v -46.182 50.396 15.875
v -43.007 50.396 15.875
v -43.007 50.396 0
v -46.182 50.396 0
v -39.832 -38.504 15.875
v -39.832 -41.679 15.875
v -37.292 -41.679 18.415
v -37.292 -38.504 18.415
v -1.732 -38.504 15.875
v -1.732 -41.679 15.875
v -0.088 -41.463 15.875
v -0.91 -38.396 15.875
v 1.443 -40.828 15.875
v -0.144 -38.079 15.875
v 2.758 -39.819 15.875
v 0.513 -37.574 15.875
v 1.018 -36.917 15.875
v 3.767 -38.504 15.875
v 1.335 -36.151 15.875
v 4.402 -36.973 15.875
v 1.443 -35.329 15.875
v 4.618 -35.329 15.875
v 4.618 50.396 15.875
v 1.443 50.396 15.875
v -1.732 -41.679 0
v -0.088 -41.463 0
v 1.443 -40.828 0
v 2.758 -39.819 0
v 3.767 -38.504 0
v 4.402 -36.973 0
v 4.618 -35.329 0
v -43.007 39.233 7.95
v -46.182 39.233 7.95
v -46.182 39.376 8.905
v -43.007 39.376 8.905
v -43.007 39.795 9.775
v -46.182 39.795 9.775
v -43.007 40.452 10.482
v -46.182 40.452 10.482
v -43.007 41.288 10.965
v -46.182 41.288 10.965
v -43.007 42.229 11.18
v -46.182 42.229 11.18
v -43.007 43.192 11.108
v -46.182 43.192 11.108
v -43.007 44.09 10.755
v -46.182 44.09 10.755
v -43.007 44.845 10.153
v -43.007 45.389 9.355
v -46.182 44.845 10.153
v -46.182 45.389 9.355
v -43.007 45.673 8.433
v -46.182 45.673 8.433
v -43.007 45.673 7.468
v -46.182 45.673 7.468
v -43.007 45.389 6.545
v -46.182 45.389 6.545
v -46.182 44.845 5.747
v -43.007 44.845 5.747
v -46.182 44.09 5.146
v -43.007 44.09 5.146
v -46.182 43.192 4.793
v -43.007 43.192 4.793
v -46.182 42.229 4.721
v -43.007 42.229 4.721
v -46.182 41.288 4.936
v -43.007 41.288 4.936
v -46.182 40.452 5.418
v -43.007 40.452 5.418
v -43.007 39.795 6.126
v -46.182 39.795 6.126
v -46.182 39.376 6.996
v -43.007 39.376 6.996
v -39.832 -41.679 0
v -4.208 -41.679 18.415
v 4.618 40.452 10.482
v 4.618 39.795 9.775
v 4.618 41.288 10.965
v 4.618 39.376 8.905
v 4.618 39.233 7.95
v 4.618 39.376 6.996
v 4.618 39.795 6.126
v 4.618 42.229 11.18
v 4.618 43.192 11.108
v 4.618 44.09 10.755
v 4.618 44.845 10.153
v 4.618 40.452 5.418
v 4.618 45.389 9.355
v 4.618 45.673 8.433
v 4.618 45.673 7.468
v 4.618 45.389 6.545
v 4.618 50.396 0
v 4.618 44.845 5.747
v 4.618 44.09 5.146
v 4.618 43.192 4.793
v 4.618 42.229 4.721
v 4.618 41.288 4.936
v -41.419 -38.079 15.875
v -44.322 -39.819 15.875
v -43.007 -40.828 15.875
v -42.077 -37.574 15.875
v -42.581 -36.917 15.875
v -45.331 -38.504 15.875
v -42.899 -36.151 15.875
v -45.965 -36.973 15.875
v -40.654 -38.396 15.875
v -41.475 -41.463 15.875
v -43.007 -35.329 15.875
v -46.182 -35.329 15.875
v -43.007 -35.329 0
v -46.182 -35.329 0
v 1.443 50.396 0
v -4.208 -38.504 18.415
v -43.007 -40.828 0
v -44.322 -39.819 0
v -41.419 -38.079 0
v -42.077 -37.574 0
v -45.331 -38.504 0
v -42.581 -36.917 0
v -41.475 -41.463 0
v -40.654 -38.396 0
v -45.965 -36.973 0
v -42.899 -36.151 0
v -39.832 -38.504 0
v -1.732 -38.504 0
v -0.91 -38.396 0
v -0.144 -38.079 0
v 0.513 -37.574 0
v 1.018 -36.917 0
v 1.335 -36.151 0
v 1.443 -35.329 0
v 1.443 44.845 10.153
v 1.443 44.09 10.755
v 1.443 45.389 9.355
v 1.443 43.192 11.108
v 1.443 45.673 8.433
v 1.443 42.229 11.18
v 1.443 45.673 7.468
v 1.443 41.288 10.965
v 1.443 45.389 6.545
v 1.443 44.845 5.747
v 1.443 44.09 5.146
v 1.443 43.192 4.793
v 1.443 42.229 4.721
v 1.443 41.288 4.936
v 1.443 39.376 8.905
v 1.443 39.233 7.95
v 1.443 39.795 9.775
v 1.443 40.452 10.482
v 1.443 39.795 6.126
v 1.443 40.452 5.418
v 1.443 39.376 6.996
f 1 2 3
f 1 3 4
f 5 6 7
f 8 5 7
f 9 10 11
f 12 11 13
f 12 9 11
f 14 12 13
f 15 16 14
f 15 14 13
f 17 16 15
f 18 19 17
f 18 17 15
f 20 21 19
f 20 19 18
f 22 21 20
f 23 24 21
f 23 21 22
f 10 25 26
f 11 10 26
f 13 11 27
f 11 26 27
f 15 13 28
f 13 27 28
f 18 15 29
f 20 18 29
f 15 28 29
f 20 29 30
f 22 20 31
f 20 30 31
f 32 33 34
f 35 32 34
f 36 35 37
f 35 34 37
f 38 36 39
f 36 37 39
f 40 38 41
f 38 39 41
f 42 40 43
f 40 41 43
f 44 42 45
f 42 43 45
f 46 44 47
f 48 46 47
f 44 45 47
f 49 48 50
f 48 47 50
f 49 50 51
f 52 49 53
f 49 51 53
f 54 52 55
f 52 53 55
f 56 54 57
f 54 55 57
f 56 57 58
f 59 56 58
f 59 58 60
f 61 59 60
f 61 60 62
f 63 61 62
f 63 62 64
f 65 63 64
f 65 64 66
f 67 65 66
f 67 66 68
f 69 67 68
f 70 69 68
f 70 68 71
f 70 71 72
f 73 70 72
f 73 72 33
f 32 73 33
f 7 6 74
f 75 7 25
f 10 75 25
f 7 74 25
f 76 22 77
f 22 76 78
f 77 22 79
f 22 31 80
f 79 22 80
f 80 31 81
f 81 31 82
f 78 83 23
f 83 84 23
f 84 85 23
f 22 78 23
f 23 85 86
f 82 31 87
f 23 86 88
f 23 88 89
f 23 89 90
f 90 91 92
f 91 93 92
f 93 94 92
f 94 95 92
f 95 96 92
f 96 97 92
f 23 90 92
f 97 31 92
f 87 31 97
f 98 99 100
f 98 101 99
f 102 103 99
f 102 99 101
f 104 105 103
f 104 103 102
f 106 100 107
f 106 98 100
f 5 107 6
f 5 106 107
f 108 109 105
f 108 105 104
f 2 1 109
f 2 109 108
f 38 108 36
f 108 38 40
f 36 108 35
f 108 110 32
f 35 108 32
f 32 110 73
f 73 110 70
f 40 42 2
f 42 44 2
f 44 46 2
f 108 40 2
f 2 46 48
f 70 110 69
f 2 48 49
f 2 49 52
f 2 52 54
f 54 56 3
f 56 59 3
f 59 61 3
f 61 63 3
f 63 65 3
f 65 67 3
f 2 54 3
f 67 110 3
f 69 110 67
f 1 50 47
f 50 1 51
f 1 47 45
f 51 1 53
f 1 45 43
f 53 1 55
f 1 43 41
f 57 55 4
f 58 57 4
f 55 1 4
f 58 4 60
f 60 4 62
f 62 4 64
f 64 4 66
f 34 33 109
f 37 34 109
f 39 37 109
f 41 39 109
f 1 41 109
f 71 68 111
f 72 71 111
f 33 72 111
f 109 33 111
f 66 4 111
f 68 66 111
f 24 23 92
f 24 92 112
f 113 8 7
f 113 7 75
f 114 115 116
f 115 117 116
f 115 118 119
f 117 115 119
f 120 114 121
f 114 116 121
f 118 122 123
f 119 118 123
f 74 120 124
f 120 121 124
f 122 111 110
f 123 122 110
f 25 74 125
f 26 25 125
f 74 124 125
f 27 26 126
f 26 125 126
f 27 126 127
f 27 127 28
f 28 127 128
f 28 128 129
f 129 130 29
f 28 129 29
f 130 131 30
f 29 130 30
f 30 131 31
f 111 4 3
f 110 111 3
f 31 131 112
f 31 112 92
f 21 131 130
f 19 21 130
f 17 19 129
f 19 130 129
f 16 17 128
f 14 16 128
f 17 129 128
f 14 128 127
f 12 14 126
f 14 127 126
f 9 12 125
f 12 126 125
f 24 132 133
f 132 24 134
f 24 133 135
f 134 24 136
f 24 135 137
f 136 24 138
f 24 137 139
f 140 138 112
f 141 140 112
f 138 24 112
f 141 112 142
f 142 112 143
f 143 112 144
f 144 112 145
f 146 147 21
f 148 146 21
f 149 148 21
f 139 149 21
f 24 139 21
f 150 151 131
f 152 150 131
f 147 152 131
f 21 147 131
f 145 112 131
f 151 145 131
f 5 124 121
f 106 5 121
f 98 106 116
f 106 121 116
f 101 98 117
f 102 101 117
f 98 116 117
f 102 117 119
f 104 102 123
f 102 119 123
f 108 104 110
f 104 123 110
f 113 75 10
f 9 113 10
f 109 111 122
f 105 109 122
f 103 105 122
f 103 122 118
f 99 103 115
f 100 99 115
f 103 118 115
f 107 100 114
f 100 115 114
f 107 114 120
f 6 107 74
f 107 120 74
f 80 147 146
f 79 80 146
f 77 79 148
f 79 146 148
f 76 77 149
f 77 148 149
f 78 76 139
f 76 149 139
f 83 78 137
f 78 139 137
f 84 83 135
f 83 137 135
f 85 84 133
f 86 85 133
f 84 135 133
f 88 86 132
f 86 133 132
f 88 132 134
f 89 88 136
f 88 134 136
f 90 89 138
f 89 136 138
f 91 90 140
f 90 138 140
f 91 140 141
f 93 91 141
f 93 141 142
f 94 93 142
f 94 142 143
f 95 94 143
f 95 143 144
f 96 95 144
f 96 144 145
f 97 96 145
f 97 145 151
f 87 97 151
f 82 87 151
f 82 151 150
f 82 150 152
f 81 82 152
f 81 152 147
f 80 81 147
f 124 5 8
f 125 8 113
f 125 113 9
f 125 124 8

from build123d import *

# Parameters (mm, degrees)
F0_W     = 38.1
F0_H     = 3.175
F1_DEPTH = 15.875
F2_W     = 38.1
F2_H     = 3.175
F3_DEPTH = 2.54
F5_DEPTH = 25.4
F6_R     = 3.2385
F7_DEPTH = 101.6


with BuildPart() as f1:
    # F0 (on Top) → F1 (new body)
    with BuildSketch(Plane.XY):
        with BuildLine():
            Line((-43.00682, 50.395912), (-46.18182, 50.395912))
            Line((-46.18182, 50.395912), (-46.18182, -35.329088))
            ThreePointArc((-46.18182, -35.329088), (-44.321948, -39.819216), (-39.83182, -41.679088))
            Line((-39.83182, -41.679088), (-39.83182, -38.504088))
            ThreePointArc((-39.83182, -38.504088), (-42.076884, -37.574152), (-43.00682, -35.329088))
            Line((-43.00682, -35.329088), (-43.00682, 50.395912))
        make_face()
        with Locations((-20.78182, -40.091588)):
            Rectangle(F0_W, F0_H)
        with BuildLine():
            Line((-1.73182, -38.504088), (-1.73182, -41.679088))
            ThreePointArc((-1.73182, -41.679088), (2.758308, -39.819216), (4.61818, -35.329088))
            Line((4.61818, -35.329088), (4.61818, 50.395912))
            Line((4.61818, 50.395912), (1.44318, 50.395912))
            Line((1.44318, 50.395912), (1.44318, -35.329088))
            ThreePointArc((1.44318, -35.329088), (0.513244, -37.574152), (-1.73182, -38.504088))
        make_face()
    extrude(amount=F1_DEPTH)

    # F2 (on face) → F3 (join)
    with BuildSketch(Plane.XY.offset(15.875)):
        with Locations((-20.78182, -40.091588)):
            Rectangle(F2_W, F2_H)
    extrude(amount=F3_DEPTH)

    # F4 (on face) → F5 (cut)
    with BuildSketch(Plane.XZ.offset(41.679088)):
        Polygon((-39.83182, 18.415), (-39.83182, 15.875), (-37.29182, 18.415), align=None)
        Polygon((-1.73182, 18.415), (-4.207504, 18.415), (-1.73182, 15.875), align=None)
    extrude(amount=-F5_DEPTH, mode=Mode.SUBTRACT)

    # F6 (on face) → F7 (cut)
    with BuildSketch(Plane(origin=(-46.18182, 0, 0), x_dir=(0, -1, 0), z_dir=(-1, 0, 0))):
        with Locations((-42.471112, 7.9502)):
            Circle(F6_R)
    extrude(amount=-F7_DEPTH, mode=Mode.SUBTRACT)


solid = f1.part
